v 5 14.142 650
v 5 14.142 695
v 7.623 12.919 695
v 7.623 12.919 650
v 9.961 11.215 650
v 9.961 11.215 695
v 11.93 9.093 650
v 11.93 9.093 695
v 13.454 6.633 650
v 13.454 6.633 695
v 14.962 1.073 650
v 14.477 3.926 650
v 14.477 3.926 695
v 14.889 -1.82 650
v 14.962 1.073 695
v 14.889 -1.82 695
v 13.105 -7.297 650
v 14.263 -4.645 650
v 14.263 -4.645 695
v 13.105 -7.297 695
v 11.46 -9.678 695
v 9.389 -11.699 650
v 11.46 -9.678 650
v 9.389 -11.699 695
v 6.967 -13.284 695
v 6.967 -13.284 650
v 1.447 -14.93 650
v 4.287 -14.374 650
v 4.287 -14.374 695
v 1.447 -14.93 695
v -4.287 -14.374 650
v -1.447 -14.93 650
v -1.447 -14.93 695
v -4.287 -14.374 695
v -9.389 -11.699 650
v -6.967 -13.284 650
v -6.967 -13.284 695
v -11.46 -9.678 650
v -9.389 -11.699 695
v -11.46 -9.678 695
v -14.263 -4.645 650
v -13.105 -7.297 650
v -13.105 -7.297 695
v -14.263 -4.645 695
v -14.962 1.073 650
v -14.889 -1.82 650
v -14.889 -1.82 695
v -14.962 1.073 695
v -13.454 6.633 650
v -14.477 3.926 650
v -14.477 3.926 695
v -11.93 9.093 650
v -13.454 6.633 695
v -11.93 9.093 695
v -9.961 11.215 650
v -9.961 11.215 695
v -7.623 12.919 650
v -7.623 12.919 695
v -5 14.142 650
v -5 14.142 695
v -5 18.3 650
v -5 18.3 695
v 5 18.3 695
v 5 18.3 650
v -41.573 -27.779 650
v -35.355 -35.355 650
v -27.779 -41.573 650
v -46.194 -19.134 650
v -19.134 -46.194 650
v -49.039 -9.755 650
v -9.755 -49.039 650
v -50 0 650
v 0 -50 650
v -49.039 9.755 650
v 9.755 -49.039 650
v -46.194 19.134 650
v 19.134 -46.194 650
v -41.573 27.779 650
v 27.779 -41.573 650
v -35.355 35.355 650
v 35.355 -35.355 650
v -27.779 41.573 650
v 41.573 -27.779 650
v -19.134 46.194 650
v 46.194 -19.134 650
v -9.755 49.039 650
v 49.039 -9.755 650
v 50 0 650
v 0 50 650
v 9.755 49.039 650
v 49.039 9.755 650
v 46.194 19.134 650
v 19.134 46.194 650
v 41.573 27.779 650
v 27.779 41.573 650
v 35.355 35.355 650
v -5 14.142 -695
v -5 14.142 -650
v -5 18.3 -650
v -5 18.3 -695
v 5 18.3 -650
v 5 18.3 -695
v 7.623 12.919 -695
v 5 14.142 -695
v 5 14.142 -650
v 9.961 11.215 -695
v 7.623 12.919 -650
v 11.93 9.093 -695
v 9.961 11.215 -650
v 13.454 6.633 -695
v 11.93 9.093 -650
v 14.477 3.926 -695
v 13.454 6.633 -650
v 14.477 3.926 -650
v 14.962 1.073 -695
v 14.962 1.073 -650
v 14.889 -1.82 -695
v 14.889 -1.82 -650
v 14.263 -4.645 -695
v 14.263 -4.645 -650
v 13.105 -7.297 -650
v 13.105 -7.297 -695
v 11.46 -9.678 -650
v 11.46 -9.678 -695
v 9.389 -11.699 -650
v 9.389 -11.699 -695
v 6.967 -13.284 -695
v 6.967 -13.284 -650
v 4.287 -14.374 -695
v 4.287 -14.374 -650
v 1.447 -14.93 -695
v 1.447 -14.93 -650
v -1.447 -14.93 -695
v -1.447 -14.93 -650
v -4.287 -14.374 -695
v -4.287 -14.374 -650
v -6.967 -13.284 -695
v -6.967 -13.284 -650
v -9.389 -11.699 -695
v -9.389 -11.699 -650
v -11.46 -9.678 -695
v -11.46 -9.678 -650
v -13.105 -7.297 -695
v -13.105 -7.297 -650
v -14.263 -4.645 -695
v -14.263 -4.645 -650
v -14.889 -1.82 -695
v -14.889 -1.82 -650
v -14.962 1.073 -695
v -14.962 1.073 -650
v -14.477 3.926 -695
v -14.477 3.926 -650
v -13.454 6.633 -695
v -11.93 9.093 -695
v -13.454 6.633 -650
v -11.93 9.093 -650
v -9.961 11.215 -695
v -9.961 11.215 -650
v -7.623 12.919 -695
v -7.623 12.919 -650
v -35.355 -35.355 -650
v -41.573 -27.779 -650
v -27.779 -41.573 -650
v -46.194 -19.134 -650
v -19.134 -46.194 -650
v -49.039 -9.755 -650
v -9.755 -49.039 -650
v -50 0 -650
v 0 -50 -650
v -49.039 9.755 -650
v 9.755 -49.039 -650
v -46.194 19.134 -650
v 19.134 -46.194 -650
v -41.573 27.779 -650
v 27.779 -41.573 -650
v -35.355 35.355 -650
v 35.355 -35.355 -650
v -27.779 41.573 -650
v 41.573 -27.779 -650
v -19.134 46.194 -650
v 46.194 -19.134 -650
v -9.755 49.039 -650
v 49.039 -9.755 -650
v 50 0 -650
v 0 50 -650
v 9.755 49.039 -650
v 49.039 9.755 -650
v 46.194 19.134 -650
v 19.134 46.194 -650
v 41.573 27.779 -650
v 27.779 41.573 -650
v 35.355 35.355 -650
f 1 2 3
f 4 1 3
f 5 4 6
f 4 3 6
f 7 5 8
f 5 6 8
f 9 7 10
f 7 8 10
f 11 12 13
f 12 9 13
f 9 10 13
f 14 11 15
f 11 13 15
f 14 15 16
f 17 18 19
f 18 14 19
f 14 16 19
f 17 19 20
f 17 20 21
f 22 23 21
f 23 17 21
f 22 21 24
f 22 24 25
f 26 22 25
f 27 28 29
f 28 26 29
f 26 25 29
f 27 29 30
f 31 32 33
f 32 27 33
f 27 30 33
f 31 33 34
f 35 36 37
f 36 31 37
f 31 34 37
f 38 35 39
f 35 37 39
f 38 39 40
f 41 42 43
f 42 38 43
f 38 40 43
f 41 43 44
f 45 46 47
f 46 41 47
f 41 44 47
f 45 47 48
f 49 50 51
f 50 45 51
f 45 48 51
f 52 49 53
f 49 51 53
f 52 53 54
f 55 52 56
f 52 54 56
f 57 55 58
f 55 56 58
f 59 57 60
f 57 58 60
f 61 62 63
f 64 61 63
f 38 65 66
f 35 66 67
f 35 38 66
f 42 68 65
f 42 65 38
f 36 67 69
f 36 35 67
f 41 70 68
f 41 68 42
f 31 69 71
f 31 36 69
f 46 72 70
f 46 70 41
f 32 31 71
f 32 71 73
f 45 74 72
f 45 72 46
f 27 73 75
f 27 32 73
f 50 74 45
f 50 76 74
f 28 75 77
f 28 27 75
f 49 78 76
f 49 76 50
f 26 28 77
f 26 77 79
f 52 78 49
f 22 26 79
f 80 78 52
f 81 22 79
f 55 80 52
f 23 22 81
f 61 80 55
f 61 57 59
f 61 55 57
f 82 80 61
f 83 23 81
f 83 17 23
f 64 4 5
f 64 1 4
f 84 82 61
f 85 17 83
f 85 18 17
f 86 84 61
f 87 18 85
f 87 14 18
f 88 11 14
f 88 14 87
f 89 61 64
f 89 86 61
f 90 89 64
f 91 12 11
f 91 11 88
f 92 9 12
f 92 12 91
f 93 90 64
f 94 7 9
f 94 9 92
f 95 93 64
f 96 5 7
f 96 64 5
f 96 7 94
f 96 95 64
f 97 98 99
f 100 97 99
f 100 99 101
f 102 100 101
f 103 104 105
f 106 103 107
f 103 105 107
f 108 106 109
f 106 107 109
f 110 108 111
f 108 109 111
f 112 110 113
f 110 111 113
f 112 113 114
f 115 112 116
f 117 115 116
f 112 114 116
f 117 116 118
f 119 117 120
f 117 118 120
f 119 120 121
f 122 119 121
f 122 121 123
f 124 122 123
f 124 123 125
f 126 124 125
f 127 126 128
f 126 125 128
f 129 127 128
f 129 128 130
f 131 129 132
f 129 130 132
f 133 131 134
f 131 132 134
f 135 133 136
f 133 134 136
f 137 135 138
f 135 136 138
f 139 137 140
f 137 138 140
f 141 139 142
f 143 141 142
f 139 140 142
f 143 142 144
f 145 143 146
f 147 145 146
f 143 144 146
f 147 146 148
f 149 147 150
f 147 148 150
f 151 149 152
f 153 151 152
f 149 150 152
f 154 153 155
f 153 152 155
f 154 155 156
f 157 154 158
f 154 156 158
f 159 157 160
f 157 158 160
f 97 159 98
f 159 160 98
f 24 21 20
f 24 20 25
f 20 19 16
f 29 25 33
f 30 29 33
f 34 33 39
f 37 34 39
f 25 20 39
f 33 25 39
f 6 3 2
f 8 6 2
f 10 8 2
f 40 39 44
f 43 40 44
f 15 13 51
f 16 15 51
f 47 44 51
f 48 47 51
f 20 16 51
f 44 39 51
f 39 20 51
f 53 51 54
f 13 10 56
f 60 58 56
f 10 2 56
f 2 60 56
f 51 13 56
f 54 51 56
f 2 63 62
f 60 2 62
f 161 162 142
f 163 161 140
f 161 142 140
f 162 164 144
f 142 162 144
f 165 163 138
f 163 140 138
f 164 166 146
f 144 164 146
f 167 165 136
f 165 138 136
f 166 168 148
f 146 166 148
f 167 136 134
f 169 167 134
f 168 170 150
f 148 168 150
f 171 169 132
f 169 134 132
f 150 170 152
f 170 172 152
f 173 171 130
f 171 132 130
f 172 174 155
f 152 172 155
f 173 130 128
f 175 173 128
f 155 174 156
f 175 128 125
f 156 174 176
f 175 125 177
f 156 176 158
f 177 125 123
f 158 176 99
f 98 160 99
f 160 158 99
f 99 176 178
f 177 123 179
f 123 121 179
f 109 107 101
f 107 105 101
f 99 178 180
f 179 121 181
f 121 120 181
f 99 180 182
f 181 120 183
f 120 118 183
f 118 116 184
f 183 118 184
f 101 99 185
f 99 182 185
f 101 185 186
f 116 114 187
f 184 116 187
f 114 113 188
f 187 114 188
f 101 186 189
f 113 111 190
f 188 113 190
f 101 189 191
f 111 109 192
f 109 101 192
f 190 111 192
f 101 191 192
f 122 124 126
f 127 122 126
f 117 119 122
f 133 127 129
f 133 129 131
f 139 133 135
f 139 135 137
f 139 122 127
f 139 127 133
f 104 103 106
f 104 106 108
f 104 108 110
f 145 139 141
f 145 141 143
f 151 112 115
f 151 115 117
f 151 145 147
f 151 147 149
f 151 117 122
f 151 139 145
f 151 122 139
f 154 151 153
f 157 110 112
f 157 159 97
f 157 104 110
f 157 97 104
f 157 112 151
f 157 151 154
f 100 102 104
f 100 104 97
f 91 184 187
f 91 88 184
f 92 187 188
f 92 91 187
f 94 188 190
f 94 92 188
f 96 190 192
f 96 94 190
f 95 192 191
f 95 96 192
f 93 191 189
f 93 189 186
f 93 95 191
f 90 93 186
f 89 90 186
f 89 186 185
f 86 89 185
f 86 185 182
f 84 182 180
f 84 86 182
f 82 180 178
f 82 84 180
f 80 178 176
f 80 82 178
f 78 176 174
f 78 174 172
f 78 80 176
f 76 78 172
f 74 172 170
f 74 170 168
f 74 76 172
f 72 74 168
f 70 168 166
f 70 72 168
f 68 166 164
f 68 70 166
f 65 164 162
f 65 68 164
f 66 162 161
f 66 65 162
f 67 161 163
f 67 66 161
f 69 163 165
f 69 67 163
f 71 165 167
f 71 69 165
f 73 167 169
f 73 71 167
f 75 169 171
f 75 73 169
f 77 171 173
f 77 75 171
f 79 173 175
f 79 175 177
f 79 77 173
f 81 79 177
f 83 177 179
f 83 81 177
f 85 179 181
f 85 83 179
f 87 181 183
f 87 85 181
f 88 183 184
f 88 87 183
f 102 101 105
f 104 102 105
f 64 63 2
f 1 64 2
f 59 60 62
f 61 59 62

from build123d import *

# Parameters (mm, degrees)
SKETCH1_R           = 50
BOSS_EXTRUDE1_DEPTH = 650
BOSS_EXTRUDE2_DEPTH = 695


with BuildPart() as part:
    # Sketch1 → Boss-Extrude1 (new, symmetric)
    with BuildSketch(Plane.XY):
        Circle(SKETCH1_R)
    extrude(amount=BOSS_EXTRUDE1_DEPTH, both=True)

    # Sketch4 → Boss-Extrude2 (add, symmetric)
    with BuildSketch(Plane.XY):
        with BuildLine():
            Line((-5, 14.142135624), (-5, 18.3))
            Line((-5, 18.3), (5, 18.3))
            Line((5, 18.3), (5, 14.142135624))
            ThreePointArc((5, 14.142135624), (0, -15), (-5, 14.142135624))
        make_face()
    extrude(amount=BOSS_EXTRUDE2_DEPTH, both=True)


solid = part.part
